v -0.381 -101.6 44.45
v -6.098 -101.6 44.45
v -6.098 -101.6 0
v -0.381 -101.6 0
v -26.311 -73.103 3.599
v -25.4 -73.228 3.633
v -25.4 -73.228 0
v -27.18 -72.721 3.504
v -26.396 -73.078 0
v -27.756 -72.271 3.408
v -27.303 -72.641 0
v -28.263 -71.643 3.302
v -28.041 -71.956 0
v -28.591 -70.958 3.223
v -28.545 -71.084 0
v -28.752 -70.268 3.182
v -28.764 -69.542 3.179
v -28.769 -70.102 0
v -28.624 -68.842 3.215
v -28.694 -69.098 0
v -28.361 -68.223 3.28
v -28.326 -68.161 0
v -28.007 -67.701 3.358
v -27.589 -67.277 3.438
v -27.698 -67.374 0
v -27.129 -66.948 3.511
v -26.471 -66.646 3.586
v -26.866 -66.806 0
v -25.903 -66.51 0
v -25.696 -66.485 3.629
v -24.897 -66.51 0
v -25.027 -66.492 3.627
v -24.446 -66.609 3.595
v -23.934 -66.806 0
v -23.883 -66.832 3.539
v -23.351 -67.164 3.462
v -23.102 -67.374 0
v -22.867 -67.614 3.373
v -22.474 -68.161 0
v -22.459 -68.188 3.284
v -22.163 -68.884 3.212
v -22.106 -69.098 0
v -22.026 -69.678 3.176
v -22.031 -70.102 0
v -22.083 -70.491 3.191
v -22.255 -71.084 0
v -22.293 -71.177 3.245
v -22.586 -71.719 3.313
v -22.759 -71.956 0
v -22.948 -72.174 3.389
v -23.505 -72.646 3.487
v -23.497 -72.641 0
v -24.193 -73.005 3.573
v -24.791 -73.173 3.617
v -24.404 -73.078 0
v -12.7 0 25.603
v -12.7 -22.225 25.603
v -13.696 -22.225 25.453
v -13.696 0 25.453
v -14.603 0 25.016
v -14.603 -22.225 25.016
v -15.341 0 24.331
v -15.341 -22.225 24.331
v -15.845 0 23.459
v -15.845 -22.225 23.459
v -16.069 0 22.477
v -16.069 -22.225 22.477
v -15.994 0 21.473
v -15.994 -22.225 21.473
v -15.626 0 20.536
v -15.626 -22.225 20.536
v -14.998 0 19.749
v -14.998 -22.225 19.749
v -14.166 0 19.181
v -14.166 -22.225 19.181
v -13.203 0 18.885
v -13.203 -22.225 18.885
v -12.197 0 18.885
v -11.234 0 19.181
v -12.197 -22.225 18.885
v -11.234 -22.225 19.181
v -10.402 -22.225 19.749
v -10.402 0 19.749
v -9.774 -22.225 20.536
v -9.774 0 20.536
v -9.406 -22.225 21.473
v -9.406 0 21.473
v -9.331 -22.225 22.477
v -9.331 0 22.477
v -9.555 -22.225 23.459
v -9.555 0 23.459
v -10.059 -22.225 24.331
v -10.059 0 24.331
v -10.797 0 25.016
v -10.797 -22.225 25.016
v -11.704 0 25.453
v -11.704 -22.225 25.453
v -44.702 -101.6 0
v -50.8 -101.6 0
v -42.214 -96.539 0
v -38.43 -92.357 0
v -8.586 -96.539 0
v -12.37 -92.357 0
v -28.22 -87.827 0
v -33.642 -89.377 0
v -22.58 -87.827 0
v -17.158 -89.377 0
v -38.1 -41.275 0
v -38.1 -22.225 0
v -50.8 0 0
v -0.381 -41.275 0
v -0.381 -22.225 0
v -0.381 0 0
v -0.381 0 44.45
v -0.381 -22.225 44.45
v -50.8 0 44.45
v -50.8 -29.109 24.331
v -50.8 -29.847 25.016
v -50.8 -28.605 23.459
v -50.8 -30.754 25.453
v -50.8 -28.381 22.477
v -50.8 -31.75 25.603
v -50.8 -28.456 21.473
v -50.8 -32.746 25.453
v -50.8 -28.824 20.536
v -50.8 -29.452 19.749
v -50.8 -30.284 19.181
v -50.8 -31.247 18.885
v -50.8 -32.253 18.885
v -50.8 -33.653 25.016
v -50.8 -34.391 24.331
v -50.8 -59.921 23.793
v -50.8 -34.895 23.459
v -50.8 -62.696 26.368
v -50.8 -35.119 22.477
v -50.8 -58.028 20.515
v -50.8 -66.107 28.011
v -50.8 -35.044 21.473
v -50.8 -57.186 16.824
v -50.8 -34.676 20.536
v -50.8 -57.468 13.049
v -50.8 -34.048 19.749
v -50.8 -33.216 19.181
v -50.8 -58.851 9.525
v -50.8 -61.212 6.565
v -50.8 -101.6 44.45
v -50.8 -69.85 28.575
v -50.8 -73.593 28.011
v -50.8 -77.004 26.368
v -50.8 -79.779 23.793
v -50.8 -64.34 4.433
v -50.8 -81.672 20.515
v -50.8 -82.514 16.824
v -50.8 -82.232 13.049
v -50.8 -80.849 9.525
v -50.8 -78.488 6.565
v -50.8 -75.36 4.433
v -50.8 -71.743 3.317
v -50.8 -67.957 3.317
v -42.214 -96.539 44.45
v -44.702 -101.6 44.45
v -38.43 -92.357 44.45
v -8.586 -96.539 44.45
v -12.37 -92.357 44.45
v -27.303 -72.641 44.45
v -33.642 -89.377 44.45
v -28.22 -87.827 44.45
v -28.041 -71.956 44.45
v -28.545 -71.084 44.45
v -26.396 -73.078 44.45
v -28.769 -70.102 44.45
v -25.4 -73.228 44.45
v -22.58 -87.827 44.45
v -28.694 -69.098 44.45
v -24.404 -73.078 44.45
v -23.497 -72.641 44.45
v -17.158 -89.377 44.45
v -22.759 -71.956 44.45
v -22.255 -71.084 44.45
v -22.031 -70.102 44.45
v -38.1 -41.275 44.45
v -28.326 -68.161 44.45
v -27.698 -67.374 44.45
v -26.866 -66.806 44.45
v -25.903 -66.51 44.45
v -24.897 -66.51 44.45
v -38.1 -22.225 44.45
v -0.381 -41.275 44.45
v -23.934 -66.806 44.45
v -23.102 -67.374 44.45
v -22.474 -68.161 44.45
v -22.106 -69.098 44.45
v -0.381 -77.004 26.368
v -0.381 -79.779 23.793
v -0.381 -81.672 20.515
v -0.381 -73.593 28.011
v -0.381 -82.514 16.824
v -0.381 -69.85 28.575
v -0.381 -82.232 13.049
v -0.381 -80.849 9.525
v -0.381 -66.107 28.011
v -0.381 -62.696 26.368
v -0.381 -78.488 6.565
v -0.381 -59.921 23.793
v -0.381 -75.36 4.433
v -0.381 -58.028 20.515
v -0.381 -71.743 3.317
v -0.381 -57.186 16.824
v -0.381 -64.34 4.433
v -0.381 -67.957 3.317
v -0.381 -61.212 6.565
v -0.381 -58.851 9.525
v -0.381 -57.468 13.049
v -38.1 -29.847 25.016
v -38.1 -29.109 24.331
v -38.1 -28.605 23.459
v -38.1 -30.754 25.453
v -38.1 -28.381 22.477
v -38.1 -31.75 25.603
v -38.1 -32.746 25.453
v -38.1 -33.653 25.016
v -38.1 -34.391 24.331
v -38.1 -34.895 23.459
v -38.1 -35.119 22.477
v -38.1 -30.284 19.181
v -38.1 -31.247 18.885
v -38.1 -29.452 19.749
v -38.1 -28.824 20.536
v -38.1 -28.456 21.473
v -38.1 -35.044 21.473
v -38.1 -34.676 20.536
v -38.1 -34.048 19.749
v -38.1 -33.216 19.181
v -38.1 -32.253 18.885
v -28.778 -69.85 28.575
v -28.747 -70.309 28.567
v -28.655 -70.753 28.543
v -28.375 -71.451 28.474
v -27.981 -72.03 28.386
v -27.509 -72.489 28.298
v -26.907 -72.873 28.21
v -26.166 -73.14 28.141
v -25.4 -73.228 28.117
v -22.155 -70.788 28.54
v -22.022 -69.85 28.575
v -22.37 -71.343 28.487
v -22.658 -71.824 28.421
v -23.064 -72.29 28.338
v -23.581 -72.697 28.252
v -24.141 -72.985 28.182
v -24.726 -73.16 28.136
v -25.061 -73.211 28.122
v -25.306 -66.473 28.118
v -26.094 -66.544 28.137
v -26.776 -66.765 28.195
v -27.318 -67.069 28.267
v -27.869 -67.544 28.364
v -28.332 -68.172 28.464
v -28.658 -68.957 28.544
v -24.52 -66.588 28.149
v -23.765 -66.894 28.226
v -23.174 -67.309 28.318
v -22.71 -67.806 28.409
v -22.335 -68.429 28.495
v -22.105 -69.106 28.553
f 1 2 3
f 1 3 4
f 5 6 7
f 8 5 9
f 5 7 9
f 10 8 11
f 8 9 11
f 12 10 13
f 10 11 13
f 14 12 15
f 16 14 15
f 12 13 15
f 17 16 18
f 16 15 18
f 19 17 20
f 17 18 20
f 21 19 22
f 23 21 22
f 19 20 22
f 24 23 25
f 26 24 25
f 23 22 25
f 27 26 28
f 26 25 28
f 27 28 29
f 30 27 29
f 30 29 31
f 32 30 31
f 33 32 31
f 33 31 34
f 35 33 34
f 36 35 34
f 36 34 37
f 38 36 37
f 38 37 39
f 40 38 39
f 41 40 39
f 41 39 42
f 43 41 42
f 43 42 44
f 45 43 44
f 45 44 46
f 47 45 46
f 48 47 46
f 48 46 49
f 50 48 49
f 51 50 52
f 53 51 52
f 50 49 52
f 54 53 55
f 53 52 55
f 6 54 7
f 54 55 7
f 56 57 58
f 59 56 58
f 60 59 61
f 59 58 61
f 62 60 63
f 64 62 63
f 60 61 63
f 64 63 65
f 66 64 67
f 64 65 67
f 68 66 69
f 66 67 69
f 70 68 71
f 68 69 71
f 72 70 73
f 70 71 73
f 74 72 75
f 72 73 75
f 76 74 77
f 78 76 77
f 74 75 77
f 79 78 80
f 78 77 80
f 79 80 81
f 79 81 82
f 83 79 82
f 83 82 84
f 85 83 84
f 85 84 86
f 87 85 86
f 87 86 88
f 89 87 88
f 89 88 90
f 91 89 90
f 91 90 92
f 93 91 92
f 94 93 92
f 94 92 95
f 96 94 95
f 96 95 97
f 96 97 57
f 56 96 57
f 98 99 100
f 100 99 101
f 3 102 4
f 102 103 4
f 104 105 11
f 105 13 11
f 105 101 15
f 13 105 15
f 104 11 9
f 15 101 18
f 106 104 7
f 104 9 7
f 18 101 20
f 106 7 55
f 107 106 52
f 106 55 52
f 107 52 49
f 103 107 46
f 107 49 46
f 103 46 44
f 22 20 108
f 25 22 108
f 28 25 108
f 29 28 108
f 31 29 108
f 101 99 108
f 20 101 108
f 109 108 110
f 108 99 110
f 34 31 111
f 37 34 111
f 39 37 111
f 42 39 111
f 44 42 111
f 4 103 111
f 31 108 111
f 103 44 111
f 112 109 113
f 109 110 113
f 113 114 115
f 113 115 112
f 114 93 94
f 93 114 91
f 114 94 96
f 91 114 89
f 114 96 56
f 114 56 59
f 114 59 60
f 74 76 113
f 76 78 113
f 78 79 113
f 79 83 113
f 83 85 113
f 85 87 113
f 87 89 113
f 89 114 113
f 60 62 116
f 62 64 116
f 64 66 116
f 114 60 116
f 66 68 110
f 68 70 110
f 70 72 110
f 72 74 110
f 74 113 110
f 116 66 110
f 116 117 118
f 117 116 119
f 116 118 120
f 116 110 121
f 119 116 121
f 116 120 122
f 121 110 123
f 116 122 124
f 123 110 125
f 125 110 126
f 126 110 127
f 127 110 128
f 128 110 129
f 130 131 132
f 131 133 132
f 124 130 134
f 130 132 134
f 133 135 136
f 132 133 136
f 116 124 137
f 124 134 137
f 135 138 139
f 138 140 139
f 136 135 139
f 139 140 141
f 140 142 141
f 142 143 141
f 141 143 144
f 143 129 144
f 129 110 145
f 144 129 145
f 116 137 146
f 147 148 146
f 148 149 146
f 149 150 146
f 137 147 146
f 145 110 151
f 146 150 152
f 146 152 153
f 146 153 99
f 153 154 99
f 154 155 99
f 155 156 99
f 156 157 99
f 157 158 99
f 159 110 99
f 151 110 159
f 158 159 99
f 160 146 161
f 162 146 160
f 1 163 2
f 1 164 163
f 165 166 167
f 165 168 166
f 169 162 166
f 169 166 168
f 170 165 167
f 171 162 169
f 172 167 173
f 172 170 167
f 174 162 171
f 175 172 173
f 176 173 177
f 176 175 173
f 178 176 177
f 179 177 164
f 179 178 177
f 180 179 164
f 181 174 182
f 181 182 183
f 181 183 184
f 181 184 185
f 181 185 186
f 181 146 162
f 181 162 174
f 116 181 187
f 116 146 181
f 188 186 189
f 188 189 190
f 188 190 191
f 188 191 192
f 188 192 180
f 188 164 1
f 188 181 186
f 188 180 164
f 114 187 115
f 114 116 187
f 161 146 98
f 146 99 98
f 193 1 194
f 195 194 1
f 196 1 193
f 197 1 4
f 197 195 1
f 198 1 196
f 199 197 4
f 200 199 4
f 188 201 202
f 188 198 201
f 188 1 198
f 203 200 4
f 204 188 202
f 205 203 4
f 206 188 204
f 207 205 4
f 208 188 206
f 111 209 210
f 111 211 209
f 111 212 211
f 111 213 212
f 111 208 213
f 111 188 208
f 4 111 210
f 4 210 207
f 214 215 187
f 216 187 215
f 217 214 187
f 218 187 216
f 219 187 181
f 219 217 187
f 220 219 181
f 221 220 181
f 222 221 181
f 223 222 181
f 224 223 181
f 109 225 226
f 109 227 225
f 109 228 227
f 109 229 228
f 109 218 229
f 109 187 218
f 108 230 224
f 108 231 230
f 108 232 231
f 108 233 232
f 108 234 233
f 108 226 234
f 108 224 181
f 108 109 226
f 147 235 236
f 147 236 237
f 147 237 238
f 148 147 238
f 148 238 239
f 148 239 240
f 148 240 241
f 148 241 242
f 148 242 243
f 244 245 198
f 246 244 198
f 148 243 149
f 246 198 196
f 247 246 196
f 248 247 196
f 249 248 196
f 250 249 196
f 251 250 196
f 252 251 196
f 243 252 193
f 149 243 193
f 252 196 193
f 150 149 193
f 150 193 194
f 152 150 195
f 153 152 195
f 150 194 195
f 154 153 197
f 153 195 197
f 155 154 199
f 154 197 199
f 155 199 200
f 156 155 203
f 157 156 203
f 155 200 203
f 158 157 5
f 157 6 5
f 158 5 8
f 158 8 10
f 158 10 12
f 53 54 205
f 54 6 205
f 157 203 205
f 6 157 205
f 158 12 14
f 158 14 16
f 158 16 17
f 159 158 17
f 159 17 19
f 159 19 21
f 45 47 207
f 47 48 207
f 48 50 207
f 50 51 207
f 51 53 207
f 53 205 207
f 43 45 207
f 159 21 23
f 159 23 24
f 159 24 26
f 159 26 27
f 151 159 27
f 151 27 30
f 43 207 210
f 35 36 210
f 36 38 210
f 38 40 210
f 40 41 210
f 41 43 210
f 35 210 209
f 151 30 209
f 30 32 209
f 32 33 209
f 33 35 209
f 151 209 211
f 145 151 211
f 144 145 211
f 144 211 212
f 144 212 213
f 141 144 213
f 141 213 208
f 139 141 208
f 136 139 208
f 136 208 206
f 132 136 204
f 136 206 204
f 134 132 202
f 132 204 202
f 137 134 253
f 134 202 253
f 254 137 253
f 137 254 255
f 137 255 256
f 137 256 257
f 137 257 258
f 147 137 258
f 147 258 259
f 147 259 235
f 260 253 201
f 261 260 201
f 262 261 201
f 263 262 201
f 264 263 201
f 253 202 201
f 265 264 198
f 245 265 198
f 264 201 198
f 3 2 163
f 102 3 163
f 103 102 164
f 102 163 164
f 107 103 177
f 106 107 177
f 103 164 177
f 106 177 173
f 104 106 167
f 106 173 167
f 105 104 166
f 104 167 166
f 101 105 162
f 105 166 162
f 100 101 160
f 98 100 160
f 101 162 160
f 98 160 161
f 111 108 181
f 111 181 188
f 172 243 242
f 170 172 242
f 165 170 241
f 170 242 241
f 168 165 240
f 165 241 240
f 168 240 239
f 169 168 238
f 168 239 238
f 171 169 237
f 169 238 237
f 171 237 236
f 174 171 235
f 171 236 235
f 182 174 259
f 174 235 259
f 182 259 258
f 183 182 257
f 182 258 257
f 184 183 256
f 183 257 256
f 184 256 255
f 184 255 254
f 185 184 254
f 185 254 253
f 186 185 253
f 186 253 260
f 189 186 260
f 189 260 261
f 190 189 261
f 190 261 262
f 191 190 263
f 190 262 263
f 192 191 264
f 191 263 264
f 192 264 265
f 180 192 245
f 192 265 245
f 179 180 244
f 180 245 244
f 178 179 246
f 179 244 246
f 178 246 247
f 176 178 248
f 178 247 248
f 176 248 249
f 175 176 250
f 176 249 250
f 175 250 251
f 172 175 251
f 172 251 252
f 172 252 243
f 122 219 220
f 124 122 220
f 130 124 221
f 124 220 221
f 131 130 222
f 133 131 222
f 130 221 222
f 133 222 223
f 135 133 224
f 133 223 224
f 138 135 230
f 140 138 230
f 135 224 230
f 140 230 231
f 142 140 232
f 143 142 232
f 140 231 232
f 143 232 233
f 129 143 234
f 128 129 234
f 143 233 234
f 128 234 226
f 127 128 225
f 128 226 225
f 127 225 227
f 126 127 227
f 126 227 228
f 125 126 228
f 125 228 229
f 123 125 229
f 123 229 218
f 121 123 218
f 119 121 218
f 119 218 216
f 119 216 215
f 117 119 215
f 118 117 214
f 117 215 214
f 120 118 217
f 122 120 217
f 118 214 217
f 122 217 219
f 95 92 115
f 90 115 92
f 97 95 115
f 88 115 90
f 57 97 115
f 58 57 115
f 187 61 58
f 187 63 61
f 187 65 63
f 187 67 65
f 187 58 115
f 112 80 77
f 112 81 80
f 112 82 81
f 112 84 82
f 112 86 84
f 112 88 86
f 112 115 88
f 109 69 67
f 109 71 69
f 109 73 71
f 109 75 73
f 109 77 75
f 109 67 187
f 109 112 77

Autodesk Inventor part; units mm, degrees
ref_plane "YZ Plane" through (0, 0, 0) normal (1, 0, 0) x (0, 1, 0)
ref_plane "XZ Plane" through (0, 0, 0) normal (0, 1, 0) x (-1, 0, 0)
ref_plane "XY Plane" through (0, 0, 0) normal (0, 0, 1) x (1, 0, 0)
sketch "Sketch1" plane through (0, 0, 0) normal (0, 0, 1) x (1, 0, 0)
  line L0 (0, 0) -> (-50.8, 0)
  line L1 (-50.8, 0) -> (-50.8, -101.6)
  line L2 (-50.8, -101.6) -> (0, -101.6)
  line L3 (0, -22.225) -> (-38.1, -22.225)
  line L4 (-38.1, -22.225) -> (-38.1, -41.275)
  line L5 (-38.1, -41.275) -> (0, -41.275)
  line L6 (0, -101.6) -> (0, -41.275)
  line L7 (0, -22.225) -> (0, 0)
  dimension "d0" = 101.6
  dimension "d1" = 50.8
  dimension "d4" = 22.225
  dimension "d5" = 38.1
  dimension "d6" = 19.05
extrude "Extrusion1" add sketch "Sketch1" along normal blind 44.45
sketch "Sketch2" plane through (0, -22.225, 0) normal (1, 0, 0) x (0, 0, -1)
  line L0 (-44.45, 0) -> (-44.45, 22.225) projected
  line L1 (0, 22.225) -> (0, -79.375) projected
  line L2 (-44.45, 22.225) -> (0, 22.225)
  line L3 (0, 22.225) -> (0, -79.375)
  line L4 (0, -79.375) -> (-44.45, -79.375)
  line L5 (-44.45, -79.375) -> (-44.45, 22.225)
extrude "Extrusion2" cut sketch "Sketch2" against normal blind 0.381
sketch "Sketch3" plane through (-50.8, 0, 44.45) normal (0, 1, 0) x (1, 0, 0)
  line L0 (0, 44.45) -> (0, 0) projected
  line L1 (50.419, 44.45) -> (0, 44.45) projected
  point P0 (50.8, 44.45)
  point P1 (38.1, 22.225)
  dimension "d9" = 38.1
  dimension "d10" = 22.225
hole "Hole1" at (-12.7, 0, 22.225) direction (0, -1, 0) diameter 6.7564 end up to surface clearance for "Flat Head Machine Screw (82)" size "1/4" standard "Ansi Unified Screw Threads"
sketch "Sketch4" plane through (-50.8, -101.6, 0) normal (-1, 0, 0) x (0, 0, 1)
  line L0 (0, 101.6) -> (0, 0) projected
  line L1 (0, 101.6) -> (44.45, 101.6) projected
  point P0 (22.225, 69.85)
  dimension "d18" = 22.225
  dimension "d19" = 31.75
hole "Hole2" at (-50.8, -31.75, 22.225) direction (1, 0, 0) diameter 6.7564 end through all clearance for "Hex Head Bolt" size "1/4" standard "Ansi Unified Screw Threads"
sketch "Sketch5" plane through (-50.8, -101.6, 0) normal (-1, 0, 0) x (0, 0, 1)
  line L0 (0, 101.6) -> (0, 0) projected
  line L1 (0, 101.6) -> (44.45, 101.6) projected
  point P0 (15.875, 31.75)
  dimension "d27" = 15.875
  dimension "d28" = 69.85
hole "Hole3" at (-50.8, -69.85, 15.875) direction (1, 0, 0) diameter 25.4 end through all
sketch "Sketch6" plane through (0, 0, 44.45) normal (0, 0, 1) x (1, 0, 0)
  line L0 (-0.381, 0) -> (-50.8, 0) projected
  line L1 (-50.8, 0) -> (-50.8, -101.6) projected
  point P0 (0, 0)
  point P1 (-25.4, -69.85)
  dimension "d36" = 69.85
  dimension "d37" = 25.4
hole "Hole4" at (-25.4, -69.85, 44.45) direction (0, 0, -1) diameter 6.7564 end through all clearance for "Hex Head Bolt" size "1/4" standard "Ansi Unified Screw Threads"
sketch "Sketch7" plane through (0, 0, 44.45) normal (0, 0, 1) x (1, 0, 0)
  circle A0 centre (-25.4, -107.95) radius 20.32
  line L0 (-0.381, 0) -> (-50.8, 0) projected
  line L1 (-50.8, 0) -> (-50.8, -101.6) projected
  point P0 (0, 0)
  dimension "d45" = 107.95
  dimension "d46" = 25.4
  dimension "d47" = 40.64
extrude "Extrusion3" cut sketch "Sketch7" against normal through all
equation "\"d10\" = 0.5 * width"
equation "\"d18\" = 0.5 * width"
equation "\"width\" = 44.45"
properties part number "RM Over Support For Arm With Delrin Slider"
